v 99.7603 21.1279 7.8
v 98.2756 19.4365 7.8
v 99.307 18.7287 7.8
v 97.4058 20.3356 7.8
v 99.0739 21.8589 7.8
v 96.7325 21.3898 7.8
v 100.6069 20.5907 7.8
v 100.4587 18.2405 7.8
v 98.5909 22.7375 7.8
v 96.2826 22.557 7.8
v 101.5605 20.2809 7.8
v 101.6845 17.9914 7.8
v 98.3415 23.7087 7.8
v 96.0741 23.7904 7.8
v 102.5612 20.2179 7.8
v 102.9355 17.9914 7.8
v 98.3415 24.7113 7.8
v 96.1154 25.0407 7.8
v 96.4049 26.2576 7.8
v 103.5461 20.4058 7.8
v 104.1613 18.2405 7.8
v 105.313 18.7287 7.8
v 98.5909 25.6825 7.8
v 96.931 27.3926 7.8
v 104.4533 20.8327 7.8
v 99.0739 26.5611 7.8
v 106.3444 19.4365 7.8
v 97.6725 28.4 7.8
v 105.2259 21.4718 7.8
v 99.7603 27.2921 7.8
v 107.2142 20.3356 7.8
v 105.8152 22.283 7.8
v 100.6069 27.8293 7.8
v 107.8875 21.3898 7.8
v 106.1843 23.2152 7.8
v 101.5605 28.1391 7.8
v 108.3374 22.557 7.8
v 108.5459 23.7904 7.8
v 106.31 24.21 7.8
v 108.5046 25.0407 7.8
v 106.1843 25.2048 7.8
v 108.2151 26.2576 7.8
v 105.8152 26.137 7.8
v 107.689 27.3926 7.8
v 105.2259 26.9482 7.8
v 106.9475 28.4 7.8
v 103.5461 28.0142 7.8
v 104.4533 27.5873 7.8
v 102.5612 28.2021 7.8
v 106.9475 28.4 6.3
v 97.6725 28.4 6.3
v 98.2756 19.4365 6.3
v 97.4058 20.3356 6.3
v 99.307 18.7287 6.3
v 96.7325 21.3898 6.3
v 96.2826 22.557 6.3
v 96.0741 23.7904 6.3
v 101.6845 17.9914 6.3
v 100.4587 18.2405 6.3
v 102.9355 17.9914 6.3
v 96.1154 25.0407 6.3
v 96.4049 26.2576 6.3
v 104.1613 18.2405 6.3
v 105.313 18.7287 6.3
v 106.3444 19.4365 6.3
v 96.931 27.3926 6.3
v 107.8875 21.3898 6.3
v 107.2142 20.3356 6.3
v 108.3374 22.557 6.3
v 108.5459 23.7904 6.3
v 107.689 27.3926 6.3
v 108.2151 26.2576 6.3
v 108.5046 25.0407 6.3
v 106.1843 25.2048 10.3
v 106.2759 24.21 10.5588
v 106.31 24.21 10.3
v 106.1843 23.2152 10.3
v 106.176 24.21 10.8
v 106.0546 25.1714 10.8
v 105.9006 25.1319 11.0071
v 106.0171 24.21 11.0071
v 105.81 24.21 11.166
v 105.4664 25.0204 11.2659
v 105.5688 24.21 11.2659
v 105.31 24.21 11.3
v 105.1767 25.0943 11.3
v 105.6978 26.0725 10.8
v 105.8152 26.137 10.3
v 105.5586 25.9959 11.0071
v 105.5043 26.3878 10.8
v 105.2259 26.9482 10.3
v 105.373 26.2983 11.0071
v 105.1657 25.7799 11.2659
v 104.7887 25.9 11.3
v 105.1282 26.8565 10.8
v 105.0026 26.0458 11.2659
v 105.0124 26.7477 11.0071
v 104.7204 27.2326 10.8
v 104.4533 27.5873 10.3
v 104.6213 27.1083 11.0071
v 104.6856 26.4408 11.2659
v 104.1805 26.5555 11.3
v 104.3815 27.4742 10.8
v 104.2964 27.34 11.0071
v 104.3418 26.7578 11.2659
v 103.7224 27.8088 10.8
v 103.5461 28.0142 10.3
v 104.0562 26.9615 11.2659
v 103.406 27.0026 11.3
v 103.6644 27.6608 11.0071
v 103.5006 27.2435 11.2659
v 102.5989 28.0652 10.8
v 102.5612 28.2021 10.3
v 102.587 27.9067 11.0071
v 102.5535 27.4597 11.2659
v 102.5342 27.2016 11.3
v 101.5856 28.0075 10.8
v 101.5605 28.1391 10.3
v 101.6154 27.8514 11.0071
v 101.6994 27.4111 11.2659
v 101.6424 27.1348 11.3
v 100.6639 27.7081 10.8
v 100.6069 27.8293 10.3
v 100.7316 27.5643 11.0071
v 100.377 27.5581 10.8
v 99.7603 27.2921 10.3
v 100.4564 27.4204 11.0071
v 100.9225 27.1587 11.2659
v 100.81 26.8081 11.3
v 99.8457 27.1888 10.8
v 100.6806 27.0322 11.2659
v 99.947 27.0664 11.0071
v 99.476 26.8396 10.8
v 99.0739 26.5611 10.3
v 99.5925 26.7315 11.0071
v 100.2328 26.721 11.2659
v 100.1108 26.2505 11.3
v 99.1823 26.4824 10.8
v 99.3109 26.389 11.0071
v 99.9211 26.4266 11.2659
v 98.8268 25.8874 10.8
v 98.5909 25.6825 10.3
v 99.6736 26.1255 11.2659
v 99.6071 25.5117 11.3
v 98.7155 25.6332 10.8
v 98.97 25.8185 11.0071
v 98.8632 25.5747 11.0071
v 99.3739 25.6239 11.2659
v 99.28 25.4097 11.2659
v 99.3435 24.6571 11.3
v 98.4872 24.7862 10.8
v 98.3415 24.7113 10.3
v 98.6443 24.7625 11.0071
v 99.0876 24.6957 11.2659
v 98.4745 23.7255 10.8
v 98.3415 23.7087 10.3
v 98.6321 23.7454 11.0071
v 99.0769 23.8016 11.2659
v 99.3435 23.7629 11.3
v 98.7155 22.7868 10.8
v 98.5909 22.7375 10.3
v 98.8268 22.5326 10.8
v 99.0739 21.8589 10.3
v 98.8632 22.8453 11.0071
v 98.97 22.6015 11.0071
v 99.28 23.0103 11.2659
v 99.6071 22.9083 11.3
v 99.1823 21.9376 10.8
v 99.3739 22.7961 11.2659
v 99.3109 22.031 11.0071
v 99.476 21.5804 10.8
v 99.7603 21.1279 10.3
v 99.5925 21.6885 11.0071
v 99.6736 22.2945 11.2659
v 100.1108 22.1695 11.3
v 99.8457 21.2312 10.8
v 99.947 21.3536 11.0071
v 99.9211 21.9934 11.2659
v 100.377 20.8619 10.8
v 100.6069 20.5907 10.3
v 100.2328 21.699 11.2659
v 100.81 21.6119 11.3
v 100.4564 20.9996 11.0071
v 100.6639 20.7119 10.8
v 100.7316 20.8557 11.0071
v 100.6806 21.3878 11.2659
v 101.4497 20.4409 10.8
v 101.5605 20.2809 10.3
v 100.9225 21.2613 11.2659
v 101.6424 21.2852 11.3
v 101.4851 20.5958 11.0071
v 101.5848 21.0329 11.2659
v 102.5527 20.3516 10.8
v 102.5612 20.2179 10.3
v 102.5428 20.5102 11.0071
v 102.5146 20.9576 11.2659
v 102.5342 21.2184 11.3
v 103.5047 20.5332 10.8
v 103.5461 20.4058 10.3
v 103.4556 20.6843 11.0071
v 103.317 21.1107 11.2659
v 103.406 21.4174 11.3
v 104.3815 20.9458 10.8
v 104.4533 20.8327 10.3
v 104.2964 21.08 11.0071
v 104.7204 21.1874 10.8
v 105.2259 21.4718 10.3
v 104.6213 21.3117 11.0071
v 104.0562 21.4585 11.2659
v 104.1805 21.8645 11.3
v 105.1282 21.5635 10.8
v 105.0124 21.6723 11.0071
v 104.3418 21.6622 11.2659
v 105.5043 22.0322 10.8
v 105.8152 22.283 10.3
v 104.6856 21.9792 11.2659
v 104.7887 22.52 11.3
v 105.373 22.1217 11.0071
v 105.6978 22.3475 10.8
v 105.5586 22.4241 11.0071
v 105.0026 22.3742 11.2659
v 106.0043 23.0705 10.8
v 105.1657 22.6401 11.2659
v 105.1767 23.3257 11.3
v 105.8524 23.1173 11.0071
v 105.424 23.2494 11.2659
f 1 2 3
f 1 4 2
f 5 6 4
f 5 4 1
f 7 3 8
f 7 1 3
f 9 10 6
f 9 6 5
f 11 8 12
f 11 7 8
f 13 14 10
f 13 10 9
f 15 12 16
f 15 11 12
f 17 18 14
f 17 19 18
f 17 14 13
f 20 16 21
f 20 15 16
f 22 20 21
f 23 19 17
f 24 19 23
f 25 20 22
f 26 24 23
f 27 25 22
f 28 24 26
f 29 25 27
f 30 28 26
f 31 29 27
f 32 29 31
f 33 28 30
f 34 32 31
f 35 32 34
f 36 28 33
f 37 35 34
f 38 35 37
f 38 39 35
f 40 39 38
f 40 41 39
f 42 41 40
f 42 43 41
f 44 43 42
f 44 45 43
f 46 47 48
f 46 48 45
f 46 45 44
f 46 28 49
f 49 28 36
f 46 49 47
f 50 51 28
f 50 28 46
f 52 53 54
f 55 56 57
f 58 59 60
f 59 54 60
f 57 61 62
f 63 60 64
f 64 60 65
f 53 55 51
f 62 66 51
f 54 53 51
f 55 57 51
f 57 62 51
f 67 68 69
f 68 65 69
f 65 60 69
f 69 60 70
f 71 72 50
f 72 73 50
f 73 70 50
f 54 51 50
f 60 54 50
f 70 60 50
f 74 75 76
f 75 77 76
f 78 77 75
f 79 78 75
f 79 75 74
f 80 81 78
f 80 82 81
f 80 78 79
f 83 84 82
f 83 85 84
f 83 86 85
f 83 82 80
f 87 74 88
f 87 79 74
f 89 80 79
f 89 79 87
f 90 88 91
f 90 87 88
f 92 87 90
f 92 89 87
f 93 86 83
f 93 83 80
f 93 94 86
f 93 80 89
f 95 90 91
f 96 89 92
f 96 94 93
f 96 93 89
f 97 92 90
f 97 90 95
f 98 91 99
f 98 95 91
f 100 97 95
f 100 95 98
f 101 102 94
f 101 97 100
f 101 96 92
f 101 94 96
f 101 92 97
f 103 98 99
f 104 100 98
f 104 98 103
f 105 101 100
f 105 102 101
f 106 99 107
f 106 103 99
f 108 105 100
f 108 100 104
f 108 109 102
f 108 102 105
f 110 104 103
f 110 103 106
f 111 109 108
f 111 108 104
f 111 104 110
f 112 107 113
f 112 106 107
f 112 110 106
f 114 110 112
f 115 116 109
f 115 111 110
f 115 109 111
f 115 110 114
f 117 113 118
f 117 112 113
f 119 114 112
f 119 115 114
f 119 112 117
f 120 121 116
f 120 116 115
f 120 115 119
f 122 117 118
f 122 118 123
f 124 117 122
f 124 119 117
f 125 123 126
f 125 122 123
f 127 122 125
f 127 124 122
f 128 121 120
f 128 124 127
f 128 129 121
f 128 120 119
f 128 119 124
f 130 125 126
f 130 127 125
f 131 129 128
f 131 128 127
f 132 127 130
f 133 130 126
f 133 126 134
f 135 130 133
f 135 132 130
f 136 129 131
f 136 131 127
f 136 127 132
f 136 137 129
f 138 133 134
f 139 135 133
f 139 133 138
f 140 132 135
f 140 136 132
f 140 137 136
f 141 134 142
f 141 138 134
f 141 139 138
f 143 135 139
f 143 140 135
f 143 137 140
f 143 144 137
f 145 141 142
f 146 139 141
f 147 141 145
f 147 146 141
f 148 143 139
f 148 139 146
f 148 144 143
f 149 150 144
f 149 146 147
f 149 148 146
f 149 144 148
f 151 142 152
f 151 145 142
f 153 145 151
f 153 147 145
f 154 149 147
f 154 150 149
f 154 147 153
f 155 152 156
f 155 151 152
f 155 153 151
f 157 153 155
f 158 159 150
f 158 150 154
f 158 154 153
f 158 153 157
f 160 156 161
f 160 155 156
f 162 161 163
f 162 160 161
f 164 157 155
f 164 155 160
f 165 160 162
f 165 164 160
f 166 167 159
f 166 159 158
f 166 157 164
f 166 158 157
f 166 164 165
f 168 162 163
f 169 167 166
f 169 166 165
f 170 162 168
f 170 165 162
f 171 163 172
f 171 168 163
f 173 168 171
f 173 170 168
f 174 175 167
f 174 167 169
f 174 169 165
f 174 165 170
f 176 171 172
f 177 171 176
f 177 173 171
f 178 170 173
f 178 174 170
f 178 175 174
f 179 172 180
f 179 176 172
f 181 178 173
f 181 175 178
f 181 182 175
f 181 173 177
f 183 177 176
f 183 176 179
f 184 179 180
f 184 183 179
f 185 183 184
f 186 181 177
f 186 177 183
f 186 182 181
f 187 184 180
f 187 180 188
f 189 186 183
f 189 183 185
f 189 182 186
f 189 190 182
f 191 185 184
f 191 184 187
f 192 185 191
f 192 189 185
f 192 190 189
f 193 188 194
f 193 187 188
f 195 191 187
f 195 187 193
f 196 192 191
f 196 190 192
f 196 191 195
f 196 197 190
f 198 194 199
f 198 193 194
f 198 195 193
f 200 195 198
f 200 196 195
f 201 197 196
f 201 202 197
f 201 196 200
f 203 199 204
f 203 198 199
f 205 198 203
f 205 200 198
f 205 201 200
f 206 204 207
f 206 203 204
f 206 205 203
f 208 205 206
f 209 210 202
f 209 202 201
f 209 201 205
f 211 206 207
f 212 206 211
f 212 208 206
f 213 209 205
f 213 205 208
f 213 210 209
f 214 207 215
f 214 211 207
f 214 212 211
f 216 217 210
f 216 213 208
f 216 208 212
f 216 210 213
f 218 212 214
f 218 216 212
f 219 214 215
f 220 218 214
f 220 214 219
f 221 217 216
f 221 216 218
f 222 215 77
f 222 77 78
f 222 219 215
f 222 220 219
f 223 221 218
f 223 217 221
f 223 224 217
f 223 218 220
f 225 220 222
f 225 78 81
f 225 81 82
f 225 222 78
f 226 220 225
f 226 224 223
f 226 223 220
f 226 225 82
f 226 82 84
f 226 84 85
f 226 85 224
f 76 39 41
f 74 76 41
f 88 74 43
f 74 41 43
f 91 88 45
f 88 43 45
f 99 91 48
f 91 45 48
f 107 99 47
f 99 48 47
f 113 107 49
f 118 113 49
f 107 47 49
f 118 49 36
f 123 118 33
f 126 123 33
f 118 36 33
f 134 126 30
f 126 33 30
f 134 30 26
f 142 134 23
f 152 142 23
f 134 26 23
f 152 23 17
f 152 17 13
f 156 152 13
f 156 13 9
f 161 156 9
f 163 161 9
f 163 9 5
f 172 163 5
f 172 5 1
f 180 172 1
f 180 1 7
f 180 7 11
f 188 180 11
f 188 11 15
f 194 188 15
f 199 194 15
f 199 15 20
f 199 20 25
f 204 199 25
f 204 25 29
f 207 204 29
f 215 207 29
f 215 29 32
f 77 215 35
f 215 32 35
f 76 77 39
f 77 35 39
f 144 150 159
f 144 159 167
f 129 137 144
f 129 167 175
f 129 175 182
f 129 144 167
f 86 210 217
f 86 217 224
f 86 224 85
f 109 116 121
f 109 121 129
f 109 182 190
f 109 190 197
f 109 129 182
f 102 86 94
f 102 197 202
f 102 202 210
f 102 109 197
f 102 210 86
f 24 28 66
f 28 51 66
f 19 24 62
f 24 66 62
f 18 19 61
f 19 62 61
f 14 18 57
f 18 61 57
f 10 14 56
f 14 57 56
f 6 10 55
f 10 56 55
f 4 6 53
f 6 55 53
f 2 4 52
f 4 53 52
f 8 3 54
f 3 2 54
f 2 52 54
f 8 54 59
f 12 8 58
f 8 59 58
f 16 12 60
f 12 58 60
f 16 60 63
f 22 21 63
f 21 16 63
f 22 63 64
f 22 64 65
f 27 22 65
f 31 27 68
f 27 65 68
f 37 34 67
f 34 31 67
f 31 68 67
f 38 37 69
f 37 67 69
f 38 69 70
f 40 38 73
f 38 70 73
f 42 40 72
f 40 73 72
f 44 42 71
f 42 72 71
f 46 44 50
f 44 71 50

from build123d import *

# Parameters (mm, degrees)
BOX117_W          = 10
BOX117_H          = 10
BOX117_DEPTH      = 10
CYLINDER013_R     = 4
CYLINDER013_DEPTH = 5
FILLET001_R       = 1
CYLINDER014_R     = 6.25
CYLINDER014_DEPTH = 1.5


with BuildPart() as cube107:
    # Box117 → Box117 (new body)
    with BuildSketch(Plane(origin=(97.4, 28.4, 0), x_dir=(1, 0, 0), z_dir=(0, 0, 1))):
        with Locations((5, 5)):
            Rectangle(BOX117_W, BOX117_H)
    extrude(amount=BOX117_DEPTH)


with BuildPart() as btn1_top:
    # Cylinder013 → Cylinder013 (new body)
    with BuildSketch(Plane(origin=(120.31, 24.21, 6.3), x_dir=(1, 0, 0), z_dir=(0, 0, 1))):
        Circle(CYLINDER013_R)
    extrude(amount=CYLINDER013_DEPTH)

    # Fillet001
    fillet001_edges = [btn1_top.edges().sort_by_distance(p)[0] for p in [
        (116.31, 24.21, 11.3),
    ]]
    fillet(fillet001_edges, radius=FILLET001_R)


with BuildPart() as cut073:
    # Cylinder014 → Cylinder014 (new body)
    with BuildSketch(Plane(origin=(120.31, 24.21, 6.3), x_dir=(1, 0, 0), z_dir=(0, 0, 1))):
        Circle(CYLINDER014_R)
    extrude(amount=CYLINDER014_DEPTH)

    # Fusion013: union Btn1_Top
    add(btn1_top.part)


with BuildPart() as cut073_1:
    # Fusion013 placement: moved
    add(cut073.part.moved(Location((-18, 0, 0))))

    # Cut073: cut Cube107
    add(cube107.part, mode=Mode.SUBTRACT)


solid = cut073_1.part
